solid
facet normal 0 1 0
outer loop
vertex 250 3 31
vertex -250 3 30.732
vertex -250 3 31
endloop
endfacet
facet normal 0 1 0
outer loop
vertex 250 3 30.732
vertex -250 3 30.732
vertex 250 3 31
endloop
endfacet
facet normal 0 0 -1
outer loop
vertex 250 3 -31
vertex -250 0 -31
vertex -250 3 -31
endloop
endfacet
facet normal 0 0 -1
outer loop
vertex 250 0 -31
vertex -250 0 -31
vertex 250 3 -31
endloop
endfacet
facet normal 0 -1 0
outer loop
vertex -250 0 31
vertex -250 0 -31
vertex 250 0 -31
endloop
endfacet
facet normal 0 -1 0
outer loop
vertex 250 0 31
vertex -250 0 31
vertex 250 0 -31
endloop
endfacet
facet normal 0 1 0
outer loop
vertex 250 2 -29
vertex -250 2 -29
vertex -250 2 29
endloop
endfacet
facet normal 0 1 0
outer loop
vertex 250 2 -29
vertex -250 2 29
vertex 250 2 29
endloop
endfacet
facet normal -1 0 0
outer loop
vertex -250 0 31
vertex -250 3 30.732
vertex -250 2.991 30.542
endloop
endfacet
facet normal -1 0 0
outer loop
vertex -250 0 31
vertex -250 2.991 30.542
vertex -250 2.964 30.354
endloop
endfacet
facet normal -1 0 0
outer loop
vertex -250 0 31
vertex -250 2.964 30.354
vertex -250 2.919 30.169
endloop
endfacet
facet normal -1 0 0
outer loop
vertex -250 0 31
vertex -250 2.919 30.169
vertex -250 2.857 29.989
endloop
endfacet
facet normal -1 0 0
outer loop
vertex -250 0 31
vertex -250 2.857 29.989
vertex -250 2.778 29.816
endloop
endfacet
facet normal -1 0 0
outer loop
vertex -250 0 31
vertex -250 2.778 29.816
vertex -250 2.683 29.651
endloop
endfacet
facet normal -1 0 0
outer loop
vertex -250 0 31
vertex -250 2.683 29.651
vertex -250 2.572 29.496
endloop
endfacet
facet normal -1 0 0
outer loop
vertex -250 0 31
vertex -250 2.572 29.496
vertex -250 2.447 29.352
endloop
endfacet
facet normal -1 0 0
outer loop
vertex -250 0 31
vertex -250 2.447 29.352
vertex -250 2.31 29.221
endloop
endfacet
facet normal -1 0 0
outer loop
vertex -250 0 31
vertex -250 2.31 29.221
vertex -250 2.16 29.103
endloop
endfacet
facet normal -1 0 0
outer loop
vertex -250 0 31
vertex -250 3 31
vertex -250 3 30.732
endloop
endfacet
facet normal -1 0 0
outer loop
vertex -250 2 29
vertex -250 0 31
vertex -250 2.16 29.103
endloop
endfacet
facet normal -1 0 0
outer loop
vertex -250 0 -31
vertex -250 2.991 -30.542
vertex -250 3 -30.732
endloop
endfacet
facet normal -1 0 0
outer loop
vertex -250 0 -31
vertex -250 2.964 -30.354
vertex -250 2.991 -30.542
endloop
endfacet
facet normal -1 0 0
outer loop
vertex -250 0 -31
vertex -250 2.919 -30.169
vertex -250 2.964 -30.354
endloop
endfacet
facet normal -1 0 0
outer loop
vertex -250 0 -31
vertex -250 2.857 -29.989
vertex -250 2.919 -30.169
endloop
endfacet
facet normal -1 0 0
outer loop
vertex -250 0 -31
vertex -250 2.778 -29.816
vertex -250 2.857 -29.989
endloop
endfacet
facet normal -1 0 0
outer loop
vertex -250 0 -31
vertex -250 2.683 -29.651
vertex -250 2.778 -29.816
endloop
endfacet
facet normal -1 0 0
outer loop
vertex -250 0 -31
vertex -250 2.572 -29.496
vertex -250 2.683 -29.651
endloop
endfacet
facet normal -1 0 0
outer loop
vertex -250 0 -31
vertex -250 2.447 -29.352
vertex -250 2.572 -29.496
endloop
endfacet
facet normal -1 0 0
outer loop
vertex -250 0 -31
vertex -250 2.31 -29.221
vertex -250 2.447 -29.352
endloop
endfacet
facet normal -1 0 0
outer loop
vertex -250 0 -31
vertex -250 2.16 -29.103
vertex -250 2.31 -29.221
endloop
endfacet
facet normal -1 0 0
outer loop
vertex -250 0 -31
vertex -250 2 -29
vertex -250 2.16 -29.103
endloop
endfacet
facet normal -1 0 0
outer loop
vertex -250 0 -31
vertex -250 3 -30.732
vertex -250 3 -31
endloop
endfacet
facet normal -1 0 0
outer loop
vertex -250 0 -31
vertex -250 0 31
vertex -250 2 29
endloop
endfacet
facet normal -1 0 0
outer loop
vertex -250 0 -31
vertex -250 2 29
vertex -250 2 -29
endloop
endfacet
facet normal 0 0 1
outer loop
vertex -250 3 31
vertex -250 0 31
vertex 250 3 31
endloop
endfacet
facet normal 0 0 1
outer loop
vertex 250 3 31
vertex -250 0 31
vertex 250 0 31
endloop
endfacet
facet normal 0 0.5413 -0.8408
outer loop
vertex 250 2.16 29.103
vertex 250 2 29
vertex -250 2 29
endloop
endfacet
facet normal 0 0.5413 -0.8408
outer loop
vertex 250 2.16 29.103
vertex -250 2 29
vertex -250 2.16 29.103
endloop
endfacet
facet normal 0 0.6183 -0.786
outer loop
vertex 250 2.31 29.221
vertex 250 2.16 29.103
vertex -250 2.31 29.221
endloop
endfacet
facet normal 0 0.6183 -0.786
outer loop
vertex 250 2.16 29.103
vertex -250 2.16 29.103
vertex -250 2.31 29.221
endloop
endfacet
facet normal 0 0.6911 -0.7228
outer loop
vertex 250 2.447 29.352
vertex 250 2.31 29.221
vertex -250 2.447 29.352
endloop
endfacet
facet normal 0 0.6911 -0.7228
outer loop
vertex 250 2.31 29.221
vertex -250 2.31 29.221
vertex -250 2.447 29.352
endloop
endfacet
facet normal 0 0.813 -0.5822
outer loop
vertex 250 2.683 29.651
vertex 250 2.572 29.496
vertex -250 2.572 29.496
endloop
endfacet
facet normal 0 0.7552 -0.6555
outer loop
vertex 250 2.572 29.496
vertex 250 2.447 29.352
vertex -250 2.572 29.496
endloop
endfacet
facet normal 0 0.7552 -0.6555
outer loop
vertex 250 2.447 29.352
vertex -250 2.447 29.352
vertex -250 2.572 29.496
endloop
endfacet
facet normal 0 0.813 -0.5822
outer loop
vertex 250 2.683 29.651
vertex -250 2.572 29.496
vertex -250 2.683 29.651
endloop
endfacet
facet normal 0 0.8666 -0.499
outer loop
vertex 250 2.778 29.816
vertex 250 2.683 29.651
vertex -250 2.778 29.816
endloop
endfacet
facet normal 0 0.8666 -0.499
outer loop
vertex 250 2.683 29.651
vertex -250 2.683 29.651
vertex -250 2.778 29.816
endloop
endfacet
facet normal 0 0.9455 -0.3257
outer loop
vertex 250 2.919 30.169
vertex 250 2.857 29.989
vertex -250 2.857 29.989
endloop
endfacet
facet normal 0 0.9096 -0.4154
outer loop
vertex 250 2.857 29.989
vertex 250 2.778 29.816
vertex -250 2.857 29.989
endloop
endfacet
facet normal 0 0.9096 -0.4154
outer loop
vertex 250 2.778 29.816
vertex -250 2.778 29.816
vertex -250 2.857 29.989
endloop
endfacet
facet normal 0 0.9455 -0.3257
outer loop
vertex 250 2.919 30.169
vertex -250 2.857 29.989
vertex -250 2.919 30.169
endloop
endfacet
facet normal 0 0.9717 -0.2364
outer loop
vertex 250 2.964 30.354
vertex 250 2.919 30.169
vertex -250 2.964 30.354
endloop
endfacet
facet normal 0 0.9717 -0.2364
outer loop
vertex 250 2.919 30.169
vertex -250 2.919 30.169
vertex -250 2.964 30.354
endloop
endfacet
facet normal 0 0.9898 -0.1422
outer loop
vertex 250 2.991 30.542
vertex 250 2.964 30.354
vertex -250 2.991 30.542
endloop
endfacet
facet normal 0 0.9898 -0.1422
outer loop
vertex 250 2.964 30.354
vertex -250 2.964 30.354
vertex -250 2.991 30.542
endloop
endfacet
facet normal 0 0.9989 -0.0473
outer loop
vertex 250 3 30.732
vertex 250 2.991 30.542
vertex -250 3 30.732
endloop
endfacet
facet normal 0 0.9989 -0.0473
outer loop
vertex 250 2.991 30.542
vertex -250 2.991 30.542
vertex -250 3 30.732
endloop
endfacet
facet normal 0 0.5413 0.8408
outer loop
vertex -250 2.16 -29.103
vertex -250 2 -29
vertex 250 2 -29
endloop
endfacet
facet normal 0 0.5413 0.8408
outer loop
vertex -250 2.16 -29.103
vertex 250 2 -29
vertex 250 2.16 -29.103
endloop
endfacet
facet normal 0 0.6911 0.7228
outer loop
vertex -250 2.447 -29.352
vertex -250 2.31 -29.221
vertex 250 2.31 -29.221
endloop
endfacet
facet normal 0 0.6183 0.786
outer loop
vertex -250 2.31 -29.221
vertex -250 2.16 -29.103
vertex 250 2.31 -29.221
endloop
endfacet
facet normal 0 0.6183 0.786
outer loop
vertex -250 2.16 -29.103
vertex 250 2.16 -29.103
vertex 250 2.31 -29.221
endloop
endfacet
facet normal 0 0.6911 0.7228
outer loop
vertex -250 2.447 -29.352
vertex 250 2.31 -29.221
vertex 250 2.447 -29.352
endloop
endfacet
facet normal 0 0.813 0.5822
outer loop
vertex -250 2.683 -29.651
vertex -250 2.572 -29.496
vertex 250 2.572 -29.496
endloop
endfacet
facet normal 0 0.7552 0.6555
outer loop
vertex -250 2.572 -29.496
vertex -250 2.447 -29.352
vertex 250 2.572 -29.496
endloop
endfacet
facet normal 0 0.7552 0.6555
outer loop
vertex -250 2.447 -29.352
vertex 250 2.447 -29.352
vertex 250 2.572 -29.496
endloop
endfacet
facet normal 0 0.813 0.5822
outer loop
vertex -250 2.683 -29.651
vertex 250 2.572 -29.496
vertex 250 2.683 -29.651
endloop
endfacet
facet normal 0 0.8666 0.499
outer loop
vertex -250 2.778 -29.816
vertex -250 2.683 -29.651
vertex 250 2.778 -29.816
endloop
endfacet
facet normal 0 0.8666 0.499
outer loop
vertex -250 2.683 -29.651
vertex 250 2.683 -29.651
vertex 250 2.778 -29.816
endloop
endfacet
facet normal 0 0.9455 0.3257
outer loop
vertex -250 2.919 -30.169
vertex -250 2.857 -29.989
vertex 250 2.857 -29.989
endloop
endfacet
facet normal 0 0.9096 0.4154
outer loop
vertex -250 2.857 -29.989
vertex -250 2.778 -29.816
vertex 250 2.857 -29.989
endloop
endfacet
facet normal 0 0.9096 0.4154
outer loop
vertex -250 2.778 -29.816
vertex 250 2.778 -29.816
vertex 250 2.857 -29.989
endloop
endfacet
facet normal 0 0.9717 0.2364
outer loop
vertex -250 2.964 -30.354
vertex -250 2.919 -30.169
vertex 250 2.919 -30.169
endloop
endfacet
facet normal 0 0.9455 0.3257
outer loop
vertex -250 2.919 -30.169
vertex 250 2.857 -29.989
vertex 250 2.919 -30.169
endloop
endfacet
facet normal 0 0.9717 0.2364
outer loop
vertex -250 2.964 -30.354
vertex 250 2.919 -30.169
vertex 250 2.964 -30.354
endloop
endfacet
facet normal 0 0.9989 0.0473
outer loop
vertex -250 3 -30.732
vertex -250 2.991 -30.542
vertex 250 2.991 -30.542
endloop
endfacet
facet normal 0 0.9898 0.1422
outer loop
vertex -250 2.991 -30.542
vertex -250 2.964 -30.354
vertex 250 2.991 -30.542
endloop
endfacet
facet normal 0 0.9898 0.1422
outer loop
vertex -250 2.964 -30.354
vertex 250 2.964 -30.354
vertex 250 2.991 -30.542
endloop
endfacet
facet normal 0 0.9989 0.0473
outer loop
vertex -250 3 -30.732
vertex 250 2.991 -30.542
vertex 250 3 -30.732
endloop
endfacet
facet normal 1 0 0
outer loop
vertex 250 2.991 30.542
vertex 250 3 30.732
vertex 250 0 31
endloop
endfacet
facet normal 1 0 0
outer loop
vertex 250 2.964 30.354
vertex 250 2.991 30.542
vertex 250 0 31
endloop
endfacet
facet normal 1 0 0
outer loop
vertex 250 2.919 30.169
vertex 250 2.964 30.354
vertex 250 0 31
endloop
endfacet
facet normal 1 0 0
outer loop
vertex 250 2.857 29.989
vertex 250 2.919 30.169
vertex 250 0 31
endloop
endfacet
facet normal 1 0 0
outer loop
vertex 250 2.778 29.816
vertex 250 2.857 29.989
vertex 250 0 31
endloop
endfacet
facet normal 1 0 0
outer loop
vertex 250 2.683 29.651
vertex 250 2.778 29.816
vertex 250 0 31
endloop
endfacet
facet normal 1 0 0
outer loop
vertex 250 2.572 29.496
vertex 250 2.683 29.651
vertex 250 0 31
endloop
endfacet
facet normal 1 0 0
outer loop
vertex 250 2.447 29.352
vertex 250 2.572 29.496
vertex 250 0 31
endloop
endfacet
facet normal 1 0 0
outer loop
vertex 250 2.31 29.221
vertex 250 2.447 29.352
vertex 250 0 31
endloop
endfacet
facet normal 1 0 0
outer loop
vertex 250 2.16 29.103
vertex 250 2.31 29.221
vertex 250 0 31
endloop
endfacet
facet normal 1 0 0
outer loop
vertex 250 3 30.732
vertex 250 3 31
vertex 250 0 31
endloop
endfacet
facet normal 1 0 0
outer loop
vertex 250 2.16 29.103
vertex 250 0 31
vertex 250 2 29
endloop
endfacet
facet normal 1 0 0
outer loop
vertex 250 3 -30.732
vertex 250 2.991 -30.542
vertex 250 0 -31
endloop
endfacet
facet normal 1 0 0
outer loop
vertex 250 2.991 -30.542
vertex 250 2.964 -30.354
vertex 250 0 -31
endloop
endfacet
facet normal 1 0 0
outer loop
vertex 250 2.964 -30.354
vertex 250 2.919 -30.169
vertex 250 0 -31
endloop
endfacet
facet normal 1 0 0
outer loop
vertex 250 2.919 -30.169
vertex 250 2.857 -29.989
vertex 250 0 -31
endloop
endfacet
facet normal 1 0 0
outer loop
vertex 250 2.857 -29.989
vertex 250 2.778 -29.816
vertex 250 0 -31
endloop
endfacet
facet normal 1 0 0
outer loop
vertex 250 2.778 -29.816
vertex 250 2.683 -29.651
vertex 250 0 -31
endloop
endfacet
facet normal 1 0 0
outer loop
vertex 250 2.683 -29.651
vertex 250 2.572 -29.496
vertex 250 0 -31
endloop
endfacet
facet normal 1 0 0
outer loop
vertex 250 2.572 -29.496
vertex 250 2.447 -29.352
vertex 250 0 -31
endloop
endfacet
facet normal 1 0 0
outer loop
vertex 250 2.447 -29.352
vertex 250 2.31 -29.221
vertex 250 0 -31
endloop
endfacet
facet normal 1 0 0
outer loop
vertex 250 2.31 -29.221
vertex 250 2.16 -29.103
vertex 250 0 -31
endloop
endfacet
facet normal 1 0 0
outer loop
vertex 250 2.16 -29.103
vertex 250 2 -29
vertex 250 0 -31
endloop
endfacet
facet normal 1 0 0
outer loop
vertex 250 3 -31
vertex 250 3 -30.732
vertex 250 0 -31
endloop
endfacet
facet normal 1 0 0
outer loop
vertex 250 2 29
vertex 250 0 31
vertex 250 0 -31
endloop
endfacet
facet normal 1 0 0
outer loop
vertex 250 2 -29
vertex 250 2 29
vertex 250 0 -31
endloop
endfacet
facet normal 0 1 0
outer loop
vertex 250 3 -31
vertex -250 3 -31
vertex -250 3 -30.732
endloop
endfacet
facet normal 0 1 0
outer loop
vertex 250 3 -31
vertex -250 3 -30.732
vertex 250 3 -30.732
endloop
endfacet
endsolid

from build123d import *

# Parameters (mm, degrees)
CROQUIS1_W              = 500
CROQUIS1_H              = 58
SALIENTE_EXTRUIR1_DEPTH = 2
CROQUIS4_W              = 500
CROQUIS4_H              = 2
SALIENTE_EXTRUIR2_DEPTH = 3
REDONDEO1_R             = 2


with BuildPart() as part:
    # Croquis1 → Saliente-Extruir1 (new body)
    with BuildSketch(Plane(origin=(0, 0, 0), x_dir=(1, 0, 0), z_dir=(0, 1, 0))):
        Rectangle(CROQUIS1_W, CROQUIS1_H)
    extrude(amount=SALIENTE_EXTRUIR1_DEPTH)

    # Croquis4 → Saliente-Extruir2 (add)
    with BuildSketch(Plane(origin=(0, 0, 0), x_dir=(1, 0, 0), z_dir=(0, 1, 0))):
        with Locations((0, 30)):
            Rectangle(CROQUIS4_W, CROQUIS4_H)
        with Locations((0, -30)):
            Rectangle(CROQUIS4_W, CROQUIS4_H)
    extrude(amount=SALIENTE_EXTRUIR2_DEPTH)

    # Redondeo1
    # the kernel refuses this fillet: 2 mm, written as the material it takes off along each edge
    with BuildSketch(Plane(origin=(254.330127019, 3, -29), x_dir=(0, 0, -1), z_dir=(-1, 0, 0))) as redondeo1_piece_1:
        with BuildLine():
            CenterArc((1.732050808, 2), REDONDEO1_R, 210, 60)
            Line((0, 1), (-0.034641016, 0.98))
            ThreePointArc((-0.034641016, 0.98), (-0.04, 0.5), (-0.04, 0))
            Line((-0.04, 0), (0, -0.04))
            Line((0, -0.04), (1.732050808, -0.04))
            Line((1.732050808, -0.04), (1.732050808, 0))
        make_face()
    extrude(amount=508.660254038, mode=Mode.SUBTRACT)
    with BuildSketch(Plane(origin=(-254.330127019, 3, 29), x_dir=(0, -1, 0), z_dir=(1, 0, 0))) as redondeo1_piece_2:
        with BuildLine():
            CenterArc((2, -1.732050808), REDONDEO1_R, 120, 60)
            Line((0, -1.732050808), (-0.04, -1.732050808))
            Line((-0.04, -1.732050808), (-0.04, 0))
            Line((-0.04, 0), (0, 0.04))
            ThreePointArc((0, 0.04), (0.5, 0.04), (0.98, 0.034641016))
            Line((0.98, 0.034641016), (1, 0))
        make_face()
    extrude(amount=508.660254038, mode=Mode.SUBTRACT)


solid = part.part
